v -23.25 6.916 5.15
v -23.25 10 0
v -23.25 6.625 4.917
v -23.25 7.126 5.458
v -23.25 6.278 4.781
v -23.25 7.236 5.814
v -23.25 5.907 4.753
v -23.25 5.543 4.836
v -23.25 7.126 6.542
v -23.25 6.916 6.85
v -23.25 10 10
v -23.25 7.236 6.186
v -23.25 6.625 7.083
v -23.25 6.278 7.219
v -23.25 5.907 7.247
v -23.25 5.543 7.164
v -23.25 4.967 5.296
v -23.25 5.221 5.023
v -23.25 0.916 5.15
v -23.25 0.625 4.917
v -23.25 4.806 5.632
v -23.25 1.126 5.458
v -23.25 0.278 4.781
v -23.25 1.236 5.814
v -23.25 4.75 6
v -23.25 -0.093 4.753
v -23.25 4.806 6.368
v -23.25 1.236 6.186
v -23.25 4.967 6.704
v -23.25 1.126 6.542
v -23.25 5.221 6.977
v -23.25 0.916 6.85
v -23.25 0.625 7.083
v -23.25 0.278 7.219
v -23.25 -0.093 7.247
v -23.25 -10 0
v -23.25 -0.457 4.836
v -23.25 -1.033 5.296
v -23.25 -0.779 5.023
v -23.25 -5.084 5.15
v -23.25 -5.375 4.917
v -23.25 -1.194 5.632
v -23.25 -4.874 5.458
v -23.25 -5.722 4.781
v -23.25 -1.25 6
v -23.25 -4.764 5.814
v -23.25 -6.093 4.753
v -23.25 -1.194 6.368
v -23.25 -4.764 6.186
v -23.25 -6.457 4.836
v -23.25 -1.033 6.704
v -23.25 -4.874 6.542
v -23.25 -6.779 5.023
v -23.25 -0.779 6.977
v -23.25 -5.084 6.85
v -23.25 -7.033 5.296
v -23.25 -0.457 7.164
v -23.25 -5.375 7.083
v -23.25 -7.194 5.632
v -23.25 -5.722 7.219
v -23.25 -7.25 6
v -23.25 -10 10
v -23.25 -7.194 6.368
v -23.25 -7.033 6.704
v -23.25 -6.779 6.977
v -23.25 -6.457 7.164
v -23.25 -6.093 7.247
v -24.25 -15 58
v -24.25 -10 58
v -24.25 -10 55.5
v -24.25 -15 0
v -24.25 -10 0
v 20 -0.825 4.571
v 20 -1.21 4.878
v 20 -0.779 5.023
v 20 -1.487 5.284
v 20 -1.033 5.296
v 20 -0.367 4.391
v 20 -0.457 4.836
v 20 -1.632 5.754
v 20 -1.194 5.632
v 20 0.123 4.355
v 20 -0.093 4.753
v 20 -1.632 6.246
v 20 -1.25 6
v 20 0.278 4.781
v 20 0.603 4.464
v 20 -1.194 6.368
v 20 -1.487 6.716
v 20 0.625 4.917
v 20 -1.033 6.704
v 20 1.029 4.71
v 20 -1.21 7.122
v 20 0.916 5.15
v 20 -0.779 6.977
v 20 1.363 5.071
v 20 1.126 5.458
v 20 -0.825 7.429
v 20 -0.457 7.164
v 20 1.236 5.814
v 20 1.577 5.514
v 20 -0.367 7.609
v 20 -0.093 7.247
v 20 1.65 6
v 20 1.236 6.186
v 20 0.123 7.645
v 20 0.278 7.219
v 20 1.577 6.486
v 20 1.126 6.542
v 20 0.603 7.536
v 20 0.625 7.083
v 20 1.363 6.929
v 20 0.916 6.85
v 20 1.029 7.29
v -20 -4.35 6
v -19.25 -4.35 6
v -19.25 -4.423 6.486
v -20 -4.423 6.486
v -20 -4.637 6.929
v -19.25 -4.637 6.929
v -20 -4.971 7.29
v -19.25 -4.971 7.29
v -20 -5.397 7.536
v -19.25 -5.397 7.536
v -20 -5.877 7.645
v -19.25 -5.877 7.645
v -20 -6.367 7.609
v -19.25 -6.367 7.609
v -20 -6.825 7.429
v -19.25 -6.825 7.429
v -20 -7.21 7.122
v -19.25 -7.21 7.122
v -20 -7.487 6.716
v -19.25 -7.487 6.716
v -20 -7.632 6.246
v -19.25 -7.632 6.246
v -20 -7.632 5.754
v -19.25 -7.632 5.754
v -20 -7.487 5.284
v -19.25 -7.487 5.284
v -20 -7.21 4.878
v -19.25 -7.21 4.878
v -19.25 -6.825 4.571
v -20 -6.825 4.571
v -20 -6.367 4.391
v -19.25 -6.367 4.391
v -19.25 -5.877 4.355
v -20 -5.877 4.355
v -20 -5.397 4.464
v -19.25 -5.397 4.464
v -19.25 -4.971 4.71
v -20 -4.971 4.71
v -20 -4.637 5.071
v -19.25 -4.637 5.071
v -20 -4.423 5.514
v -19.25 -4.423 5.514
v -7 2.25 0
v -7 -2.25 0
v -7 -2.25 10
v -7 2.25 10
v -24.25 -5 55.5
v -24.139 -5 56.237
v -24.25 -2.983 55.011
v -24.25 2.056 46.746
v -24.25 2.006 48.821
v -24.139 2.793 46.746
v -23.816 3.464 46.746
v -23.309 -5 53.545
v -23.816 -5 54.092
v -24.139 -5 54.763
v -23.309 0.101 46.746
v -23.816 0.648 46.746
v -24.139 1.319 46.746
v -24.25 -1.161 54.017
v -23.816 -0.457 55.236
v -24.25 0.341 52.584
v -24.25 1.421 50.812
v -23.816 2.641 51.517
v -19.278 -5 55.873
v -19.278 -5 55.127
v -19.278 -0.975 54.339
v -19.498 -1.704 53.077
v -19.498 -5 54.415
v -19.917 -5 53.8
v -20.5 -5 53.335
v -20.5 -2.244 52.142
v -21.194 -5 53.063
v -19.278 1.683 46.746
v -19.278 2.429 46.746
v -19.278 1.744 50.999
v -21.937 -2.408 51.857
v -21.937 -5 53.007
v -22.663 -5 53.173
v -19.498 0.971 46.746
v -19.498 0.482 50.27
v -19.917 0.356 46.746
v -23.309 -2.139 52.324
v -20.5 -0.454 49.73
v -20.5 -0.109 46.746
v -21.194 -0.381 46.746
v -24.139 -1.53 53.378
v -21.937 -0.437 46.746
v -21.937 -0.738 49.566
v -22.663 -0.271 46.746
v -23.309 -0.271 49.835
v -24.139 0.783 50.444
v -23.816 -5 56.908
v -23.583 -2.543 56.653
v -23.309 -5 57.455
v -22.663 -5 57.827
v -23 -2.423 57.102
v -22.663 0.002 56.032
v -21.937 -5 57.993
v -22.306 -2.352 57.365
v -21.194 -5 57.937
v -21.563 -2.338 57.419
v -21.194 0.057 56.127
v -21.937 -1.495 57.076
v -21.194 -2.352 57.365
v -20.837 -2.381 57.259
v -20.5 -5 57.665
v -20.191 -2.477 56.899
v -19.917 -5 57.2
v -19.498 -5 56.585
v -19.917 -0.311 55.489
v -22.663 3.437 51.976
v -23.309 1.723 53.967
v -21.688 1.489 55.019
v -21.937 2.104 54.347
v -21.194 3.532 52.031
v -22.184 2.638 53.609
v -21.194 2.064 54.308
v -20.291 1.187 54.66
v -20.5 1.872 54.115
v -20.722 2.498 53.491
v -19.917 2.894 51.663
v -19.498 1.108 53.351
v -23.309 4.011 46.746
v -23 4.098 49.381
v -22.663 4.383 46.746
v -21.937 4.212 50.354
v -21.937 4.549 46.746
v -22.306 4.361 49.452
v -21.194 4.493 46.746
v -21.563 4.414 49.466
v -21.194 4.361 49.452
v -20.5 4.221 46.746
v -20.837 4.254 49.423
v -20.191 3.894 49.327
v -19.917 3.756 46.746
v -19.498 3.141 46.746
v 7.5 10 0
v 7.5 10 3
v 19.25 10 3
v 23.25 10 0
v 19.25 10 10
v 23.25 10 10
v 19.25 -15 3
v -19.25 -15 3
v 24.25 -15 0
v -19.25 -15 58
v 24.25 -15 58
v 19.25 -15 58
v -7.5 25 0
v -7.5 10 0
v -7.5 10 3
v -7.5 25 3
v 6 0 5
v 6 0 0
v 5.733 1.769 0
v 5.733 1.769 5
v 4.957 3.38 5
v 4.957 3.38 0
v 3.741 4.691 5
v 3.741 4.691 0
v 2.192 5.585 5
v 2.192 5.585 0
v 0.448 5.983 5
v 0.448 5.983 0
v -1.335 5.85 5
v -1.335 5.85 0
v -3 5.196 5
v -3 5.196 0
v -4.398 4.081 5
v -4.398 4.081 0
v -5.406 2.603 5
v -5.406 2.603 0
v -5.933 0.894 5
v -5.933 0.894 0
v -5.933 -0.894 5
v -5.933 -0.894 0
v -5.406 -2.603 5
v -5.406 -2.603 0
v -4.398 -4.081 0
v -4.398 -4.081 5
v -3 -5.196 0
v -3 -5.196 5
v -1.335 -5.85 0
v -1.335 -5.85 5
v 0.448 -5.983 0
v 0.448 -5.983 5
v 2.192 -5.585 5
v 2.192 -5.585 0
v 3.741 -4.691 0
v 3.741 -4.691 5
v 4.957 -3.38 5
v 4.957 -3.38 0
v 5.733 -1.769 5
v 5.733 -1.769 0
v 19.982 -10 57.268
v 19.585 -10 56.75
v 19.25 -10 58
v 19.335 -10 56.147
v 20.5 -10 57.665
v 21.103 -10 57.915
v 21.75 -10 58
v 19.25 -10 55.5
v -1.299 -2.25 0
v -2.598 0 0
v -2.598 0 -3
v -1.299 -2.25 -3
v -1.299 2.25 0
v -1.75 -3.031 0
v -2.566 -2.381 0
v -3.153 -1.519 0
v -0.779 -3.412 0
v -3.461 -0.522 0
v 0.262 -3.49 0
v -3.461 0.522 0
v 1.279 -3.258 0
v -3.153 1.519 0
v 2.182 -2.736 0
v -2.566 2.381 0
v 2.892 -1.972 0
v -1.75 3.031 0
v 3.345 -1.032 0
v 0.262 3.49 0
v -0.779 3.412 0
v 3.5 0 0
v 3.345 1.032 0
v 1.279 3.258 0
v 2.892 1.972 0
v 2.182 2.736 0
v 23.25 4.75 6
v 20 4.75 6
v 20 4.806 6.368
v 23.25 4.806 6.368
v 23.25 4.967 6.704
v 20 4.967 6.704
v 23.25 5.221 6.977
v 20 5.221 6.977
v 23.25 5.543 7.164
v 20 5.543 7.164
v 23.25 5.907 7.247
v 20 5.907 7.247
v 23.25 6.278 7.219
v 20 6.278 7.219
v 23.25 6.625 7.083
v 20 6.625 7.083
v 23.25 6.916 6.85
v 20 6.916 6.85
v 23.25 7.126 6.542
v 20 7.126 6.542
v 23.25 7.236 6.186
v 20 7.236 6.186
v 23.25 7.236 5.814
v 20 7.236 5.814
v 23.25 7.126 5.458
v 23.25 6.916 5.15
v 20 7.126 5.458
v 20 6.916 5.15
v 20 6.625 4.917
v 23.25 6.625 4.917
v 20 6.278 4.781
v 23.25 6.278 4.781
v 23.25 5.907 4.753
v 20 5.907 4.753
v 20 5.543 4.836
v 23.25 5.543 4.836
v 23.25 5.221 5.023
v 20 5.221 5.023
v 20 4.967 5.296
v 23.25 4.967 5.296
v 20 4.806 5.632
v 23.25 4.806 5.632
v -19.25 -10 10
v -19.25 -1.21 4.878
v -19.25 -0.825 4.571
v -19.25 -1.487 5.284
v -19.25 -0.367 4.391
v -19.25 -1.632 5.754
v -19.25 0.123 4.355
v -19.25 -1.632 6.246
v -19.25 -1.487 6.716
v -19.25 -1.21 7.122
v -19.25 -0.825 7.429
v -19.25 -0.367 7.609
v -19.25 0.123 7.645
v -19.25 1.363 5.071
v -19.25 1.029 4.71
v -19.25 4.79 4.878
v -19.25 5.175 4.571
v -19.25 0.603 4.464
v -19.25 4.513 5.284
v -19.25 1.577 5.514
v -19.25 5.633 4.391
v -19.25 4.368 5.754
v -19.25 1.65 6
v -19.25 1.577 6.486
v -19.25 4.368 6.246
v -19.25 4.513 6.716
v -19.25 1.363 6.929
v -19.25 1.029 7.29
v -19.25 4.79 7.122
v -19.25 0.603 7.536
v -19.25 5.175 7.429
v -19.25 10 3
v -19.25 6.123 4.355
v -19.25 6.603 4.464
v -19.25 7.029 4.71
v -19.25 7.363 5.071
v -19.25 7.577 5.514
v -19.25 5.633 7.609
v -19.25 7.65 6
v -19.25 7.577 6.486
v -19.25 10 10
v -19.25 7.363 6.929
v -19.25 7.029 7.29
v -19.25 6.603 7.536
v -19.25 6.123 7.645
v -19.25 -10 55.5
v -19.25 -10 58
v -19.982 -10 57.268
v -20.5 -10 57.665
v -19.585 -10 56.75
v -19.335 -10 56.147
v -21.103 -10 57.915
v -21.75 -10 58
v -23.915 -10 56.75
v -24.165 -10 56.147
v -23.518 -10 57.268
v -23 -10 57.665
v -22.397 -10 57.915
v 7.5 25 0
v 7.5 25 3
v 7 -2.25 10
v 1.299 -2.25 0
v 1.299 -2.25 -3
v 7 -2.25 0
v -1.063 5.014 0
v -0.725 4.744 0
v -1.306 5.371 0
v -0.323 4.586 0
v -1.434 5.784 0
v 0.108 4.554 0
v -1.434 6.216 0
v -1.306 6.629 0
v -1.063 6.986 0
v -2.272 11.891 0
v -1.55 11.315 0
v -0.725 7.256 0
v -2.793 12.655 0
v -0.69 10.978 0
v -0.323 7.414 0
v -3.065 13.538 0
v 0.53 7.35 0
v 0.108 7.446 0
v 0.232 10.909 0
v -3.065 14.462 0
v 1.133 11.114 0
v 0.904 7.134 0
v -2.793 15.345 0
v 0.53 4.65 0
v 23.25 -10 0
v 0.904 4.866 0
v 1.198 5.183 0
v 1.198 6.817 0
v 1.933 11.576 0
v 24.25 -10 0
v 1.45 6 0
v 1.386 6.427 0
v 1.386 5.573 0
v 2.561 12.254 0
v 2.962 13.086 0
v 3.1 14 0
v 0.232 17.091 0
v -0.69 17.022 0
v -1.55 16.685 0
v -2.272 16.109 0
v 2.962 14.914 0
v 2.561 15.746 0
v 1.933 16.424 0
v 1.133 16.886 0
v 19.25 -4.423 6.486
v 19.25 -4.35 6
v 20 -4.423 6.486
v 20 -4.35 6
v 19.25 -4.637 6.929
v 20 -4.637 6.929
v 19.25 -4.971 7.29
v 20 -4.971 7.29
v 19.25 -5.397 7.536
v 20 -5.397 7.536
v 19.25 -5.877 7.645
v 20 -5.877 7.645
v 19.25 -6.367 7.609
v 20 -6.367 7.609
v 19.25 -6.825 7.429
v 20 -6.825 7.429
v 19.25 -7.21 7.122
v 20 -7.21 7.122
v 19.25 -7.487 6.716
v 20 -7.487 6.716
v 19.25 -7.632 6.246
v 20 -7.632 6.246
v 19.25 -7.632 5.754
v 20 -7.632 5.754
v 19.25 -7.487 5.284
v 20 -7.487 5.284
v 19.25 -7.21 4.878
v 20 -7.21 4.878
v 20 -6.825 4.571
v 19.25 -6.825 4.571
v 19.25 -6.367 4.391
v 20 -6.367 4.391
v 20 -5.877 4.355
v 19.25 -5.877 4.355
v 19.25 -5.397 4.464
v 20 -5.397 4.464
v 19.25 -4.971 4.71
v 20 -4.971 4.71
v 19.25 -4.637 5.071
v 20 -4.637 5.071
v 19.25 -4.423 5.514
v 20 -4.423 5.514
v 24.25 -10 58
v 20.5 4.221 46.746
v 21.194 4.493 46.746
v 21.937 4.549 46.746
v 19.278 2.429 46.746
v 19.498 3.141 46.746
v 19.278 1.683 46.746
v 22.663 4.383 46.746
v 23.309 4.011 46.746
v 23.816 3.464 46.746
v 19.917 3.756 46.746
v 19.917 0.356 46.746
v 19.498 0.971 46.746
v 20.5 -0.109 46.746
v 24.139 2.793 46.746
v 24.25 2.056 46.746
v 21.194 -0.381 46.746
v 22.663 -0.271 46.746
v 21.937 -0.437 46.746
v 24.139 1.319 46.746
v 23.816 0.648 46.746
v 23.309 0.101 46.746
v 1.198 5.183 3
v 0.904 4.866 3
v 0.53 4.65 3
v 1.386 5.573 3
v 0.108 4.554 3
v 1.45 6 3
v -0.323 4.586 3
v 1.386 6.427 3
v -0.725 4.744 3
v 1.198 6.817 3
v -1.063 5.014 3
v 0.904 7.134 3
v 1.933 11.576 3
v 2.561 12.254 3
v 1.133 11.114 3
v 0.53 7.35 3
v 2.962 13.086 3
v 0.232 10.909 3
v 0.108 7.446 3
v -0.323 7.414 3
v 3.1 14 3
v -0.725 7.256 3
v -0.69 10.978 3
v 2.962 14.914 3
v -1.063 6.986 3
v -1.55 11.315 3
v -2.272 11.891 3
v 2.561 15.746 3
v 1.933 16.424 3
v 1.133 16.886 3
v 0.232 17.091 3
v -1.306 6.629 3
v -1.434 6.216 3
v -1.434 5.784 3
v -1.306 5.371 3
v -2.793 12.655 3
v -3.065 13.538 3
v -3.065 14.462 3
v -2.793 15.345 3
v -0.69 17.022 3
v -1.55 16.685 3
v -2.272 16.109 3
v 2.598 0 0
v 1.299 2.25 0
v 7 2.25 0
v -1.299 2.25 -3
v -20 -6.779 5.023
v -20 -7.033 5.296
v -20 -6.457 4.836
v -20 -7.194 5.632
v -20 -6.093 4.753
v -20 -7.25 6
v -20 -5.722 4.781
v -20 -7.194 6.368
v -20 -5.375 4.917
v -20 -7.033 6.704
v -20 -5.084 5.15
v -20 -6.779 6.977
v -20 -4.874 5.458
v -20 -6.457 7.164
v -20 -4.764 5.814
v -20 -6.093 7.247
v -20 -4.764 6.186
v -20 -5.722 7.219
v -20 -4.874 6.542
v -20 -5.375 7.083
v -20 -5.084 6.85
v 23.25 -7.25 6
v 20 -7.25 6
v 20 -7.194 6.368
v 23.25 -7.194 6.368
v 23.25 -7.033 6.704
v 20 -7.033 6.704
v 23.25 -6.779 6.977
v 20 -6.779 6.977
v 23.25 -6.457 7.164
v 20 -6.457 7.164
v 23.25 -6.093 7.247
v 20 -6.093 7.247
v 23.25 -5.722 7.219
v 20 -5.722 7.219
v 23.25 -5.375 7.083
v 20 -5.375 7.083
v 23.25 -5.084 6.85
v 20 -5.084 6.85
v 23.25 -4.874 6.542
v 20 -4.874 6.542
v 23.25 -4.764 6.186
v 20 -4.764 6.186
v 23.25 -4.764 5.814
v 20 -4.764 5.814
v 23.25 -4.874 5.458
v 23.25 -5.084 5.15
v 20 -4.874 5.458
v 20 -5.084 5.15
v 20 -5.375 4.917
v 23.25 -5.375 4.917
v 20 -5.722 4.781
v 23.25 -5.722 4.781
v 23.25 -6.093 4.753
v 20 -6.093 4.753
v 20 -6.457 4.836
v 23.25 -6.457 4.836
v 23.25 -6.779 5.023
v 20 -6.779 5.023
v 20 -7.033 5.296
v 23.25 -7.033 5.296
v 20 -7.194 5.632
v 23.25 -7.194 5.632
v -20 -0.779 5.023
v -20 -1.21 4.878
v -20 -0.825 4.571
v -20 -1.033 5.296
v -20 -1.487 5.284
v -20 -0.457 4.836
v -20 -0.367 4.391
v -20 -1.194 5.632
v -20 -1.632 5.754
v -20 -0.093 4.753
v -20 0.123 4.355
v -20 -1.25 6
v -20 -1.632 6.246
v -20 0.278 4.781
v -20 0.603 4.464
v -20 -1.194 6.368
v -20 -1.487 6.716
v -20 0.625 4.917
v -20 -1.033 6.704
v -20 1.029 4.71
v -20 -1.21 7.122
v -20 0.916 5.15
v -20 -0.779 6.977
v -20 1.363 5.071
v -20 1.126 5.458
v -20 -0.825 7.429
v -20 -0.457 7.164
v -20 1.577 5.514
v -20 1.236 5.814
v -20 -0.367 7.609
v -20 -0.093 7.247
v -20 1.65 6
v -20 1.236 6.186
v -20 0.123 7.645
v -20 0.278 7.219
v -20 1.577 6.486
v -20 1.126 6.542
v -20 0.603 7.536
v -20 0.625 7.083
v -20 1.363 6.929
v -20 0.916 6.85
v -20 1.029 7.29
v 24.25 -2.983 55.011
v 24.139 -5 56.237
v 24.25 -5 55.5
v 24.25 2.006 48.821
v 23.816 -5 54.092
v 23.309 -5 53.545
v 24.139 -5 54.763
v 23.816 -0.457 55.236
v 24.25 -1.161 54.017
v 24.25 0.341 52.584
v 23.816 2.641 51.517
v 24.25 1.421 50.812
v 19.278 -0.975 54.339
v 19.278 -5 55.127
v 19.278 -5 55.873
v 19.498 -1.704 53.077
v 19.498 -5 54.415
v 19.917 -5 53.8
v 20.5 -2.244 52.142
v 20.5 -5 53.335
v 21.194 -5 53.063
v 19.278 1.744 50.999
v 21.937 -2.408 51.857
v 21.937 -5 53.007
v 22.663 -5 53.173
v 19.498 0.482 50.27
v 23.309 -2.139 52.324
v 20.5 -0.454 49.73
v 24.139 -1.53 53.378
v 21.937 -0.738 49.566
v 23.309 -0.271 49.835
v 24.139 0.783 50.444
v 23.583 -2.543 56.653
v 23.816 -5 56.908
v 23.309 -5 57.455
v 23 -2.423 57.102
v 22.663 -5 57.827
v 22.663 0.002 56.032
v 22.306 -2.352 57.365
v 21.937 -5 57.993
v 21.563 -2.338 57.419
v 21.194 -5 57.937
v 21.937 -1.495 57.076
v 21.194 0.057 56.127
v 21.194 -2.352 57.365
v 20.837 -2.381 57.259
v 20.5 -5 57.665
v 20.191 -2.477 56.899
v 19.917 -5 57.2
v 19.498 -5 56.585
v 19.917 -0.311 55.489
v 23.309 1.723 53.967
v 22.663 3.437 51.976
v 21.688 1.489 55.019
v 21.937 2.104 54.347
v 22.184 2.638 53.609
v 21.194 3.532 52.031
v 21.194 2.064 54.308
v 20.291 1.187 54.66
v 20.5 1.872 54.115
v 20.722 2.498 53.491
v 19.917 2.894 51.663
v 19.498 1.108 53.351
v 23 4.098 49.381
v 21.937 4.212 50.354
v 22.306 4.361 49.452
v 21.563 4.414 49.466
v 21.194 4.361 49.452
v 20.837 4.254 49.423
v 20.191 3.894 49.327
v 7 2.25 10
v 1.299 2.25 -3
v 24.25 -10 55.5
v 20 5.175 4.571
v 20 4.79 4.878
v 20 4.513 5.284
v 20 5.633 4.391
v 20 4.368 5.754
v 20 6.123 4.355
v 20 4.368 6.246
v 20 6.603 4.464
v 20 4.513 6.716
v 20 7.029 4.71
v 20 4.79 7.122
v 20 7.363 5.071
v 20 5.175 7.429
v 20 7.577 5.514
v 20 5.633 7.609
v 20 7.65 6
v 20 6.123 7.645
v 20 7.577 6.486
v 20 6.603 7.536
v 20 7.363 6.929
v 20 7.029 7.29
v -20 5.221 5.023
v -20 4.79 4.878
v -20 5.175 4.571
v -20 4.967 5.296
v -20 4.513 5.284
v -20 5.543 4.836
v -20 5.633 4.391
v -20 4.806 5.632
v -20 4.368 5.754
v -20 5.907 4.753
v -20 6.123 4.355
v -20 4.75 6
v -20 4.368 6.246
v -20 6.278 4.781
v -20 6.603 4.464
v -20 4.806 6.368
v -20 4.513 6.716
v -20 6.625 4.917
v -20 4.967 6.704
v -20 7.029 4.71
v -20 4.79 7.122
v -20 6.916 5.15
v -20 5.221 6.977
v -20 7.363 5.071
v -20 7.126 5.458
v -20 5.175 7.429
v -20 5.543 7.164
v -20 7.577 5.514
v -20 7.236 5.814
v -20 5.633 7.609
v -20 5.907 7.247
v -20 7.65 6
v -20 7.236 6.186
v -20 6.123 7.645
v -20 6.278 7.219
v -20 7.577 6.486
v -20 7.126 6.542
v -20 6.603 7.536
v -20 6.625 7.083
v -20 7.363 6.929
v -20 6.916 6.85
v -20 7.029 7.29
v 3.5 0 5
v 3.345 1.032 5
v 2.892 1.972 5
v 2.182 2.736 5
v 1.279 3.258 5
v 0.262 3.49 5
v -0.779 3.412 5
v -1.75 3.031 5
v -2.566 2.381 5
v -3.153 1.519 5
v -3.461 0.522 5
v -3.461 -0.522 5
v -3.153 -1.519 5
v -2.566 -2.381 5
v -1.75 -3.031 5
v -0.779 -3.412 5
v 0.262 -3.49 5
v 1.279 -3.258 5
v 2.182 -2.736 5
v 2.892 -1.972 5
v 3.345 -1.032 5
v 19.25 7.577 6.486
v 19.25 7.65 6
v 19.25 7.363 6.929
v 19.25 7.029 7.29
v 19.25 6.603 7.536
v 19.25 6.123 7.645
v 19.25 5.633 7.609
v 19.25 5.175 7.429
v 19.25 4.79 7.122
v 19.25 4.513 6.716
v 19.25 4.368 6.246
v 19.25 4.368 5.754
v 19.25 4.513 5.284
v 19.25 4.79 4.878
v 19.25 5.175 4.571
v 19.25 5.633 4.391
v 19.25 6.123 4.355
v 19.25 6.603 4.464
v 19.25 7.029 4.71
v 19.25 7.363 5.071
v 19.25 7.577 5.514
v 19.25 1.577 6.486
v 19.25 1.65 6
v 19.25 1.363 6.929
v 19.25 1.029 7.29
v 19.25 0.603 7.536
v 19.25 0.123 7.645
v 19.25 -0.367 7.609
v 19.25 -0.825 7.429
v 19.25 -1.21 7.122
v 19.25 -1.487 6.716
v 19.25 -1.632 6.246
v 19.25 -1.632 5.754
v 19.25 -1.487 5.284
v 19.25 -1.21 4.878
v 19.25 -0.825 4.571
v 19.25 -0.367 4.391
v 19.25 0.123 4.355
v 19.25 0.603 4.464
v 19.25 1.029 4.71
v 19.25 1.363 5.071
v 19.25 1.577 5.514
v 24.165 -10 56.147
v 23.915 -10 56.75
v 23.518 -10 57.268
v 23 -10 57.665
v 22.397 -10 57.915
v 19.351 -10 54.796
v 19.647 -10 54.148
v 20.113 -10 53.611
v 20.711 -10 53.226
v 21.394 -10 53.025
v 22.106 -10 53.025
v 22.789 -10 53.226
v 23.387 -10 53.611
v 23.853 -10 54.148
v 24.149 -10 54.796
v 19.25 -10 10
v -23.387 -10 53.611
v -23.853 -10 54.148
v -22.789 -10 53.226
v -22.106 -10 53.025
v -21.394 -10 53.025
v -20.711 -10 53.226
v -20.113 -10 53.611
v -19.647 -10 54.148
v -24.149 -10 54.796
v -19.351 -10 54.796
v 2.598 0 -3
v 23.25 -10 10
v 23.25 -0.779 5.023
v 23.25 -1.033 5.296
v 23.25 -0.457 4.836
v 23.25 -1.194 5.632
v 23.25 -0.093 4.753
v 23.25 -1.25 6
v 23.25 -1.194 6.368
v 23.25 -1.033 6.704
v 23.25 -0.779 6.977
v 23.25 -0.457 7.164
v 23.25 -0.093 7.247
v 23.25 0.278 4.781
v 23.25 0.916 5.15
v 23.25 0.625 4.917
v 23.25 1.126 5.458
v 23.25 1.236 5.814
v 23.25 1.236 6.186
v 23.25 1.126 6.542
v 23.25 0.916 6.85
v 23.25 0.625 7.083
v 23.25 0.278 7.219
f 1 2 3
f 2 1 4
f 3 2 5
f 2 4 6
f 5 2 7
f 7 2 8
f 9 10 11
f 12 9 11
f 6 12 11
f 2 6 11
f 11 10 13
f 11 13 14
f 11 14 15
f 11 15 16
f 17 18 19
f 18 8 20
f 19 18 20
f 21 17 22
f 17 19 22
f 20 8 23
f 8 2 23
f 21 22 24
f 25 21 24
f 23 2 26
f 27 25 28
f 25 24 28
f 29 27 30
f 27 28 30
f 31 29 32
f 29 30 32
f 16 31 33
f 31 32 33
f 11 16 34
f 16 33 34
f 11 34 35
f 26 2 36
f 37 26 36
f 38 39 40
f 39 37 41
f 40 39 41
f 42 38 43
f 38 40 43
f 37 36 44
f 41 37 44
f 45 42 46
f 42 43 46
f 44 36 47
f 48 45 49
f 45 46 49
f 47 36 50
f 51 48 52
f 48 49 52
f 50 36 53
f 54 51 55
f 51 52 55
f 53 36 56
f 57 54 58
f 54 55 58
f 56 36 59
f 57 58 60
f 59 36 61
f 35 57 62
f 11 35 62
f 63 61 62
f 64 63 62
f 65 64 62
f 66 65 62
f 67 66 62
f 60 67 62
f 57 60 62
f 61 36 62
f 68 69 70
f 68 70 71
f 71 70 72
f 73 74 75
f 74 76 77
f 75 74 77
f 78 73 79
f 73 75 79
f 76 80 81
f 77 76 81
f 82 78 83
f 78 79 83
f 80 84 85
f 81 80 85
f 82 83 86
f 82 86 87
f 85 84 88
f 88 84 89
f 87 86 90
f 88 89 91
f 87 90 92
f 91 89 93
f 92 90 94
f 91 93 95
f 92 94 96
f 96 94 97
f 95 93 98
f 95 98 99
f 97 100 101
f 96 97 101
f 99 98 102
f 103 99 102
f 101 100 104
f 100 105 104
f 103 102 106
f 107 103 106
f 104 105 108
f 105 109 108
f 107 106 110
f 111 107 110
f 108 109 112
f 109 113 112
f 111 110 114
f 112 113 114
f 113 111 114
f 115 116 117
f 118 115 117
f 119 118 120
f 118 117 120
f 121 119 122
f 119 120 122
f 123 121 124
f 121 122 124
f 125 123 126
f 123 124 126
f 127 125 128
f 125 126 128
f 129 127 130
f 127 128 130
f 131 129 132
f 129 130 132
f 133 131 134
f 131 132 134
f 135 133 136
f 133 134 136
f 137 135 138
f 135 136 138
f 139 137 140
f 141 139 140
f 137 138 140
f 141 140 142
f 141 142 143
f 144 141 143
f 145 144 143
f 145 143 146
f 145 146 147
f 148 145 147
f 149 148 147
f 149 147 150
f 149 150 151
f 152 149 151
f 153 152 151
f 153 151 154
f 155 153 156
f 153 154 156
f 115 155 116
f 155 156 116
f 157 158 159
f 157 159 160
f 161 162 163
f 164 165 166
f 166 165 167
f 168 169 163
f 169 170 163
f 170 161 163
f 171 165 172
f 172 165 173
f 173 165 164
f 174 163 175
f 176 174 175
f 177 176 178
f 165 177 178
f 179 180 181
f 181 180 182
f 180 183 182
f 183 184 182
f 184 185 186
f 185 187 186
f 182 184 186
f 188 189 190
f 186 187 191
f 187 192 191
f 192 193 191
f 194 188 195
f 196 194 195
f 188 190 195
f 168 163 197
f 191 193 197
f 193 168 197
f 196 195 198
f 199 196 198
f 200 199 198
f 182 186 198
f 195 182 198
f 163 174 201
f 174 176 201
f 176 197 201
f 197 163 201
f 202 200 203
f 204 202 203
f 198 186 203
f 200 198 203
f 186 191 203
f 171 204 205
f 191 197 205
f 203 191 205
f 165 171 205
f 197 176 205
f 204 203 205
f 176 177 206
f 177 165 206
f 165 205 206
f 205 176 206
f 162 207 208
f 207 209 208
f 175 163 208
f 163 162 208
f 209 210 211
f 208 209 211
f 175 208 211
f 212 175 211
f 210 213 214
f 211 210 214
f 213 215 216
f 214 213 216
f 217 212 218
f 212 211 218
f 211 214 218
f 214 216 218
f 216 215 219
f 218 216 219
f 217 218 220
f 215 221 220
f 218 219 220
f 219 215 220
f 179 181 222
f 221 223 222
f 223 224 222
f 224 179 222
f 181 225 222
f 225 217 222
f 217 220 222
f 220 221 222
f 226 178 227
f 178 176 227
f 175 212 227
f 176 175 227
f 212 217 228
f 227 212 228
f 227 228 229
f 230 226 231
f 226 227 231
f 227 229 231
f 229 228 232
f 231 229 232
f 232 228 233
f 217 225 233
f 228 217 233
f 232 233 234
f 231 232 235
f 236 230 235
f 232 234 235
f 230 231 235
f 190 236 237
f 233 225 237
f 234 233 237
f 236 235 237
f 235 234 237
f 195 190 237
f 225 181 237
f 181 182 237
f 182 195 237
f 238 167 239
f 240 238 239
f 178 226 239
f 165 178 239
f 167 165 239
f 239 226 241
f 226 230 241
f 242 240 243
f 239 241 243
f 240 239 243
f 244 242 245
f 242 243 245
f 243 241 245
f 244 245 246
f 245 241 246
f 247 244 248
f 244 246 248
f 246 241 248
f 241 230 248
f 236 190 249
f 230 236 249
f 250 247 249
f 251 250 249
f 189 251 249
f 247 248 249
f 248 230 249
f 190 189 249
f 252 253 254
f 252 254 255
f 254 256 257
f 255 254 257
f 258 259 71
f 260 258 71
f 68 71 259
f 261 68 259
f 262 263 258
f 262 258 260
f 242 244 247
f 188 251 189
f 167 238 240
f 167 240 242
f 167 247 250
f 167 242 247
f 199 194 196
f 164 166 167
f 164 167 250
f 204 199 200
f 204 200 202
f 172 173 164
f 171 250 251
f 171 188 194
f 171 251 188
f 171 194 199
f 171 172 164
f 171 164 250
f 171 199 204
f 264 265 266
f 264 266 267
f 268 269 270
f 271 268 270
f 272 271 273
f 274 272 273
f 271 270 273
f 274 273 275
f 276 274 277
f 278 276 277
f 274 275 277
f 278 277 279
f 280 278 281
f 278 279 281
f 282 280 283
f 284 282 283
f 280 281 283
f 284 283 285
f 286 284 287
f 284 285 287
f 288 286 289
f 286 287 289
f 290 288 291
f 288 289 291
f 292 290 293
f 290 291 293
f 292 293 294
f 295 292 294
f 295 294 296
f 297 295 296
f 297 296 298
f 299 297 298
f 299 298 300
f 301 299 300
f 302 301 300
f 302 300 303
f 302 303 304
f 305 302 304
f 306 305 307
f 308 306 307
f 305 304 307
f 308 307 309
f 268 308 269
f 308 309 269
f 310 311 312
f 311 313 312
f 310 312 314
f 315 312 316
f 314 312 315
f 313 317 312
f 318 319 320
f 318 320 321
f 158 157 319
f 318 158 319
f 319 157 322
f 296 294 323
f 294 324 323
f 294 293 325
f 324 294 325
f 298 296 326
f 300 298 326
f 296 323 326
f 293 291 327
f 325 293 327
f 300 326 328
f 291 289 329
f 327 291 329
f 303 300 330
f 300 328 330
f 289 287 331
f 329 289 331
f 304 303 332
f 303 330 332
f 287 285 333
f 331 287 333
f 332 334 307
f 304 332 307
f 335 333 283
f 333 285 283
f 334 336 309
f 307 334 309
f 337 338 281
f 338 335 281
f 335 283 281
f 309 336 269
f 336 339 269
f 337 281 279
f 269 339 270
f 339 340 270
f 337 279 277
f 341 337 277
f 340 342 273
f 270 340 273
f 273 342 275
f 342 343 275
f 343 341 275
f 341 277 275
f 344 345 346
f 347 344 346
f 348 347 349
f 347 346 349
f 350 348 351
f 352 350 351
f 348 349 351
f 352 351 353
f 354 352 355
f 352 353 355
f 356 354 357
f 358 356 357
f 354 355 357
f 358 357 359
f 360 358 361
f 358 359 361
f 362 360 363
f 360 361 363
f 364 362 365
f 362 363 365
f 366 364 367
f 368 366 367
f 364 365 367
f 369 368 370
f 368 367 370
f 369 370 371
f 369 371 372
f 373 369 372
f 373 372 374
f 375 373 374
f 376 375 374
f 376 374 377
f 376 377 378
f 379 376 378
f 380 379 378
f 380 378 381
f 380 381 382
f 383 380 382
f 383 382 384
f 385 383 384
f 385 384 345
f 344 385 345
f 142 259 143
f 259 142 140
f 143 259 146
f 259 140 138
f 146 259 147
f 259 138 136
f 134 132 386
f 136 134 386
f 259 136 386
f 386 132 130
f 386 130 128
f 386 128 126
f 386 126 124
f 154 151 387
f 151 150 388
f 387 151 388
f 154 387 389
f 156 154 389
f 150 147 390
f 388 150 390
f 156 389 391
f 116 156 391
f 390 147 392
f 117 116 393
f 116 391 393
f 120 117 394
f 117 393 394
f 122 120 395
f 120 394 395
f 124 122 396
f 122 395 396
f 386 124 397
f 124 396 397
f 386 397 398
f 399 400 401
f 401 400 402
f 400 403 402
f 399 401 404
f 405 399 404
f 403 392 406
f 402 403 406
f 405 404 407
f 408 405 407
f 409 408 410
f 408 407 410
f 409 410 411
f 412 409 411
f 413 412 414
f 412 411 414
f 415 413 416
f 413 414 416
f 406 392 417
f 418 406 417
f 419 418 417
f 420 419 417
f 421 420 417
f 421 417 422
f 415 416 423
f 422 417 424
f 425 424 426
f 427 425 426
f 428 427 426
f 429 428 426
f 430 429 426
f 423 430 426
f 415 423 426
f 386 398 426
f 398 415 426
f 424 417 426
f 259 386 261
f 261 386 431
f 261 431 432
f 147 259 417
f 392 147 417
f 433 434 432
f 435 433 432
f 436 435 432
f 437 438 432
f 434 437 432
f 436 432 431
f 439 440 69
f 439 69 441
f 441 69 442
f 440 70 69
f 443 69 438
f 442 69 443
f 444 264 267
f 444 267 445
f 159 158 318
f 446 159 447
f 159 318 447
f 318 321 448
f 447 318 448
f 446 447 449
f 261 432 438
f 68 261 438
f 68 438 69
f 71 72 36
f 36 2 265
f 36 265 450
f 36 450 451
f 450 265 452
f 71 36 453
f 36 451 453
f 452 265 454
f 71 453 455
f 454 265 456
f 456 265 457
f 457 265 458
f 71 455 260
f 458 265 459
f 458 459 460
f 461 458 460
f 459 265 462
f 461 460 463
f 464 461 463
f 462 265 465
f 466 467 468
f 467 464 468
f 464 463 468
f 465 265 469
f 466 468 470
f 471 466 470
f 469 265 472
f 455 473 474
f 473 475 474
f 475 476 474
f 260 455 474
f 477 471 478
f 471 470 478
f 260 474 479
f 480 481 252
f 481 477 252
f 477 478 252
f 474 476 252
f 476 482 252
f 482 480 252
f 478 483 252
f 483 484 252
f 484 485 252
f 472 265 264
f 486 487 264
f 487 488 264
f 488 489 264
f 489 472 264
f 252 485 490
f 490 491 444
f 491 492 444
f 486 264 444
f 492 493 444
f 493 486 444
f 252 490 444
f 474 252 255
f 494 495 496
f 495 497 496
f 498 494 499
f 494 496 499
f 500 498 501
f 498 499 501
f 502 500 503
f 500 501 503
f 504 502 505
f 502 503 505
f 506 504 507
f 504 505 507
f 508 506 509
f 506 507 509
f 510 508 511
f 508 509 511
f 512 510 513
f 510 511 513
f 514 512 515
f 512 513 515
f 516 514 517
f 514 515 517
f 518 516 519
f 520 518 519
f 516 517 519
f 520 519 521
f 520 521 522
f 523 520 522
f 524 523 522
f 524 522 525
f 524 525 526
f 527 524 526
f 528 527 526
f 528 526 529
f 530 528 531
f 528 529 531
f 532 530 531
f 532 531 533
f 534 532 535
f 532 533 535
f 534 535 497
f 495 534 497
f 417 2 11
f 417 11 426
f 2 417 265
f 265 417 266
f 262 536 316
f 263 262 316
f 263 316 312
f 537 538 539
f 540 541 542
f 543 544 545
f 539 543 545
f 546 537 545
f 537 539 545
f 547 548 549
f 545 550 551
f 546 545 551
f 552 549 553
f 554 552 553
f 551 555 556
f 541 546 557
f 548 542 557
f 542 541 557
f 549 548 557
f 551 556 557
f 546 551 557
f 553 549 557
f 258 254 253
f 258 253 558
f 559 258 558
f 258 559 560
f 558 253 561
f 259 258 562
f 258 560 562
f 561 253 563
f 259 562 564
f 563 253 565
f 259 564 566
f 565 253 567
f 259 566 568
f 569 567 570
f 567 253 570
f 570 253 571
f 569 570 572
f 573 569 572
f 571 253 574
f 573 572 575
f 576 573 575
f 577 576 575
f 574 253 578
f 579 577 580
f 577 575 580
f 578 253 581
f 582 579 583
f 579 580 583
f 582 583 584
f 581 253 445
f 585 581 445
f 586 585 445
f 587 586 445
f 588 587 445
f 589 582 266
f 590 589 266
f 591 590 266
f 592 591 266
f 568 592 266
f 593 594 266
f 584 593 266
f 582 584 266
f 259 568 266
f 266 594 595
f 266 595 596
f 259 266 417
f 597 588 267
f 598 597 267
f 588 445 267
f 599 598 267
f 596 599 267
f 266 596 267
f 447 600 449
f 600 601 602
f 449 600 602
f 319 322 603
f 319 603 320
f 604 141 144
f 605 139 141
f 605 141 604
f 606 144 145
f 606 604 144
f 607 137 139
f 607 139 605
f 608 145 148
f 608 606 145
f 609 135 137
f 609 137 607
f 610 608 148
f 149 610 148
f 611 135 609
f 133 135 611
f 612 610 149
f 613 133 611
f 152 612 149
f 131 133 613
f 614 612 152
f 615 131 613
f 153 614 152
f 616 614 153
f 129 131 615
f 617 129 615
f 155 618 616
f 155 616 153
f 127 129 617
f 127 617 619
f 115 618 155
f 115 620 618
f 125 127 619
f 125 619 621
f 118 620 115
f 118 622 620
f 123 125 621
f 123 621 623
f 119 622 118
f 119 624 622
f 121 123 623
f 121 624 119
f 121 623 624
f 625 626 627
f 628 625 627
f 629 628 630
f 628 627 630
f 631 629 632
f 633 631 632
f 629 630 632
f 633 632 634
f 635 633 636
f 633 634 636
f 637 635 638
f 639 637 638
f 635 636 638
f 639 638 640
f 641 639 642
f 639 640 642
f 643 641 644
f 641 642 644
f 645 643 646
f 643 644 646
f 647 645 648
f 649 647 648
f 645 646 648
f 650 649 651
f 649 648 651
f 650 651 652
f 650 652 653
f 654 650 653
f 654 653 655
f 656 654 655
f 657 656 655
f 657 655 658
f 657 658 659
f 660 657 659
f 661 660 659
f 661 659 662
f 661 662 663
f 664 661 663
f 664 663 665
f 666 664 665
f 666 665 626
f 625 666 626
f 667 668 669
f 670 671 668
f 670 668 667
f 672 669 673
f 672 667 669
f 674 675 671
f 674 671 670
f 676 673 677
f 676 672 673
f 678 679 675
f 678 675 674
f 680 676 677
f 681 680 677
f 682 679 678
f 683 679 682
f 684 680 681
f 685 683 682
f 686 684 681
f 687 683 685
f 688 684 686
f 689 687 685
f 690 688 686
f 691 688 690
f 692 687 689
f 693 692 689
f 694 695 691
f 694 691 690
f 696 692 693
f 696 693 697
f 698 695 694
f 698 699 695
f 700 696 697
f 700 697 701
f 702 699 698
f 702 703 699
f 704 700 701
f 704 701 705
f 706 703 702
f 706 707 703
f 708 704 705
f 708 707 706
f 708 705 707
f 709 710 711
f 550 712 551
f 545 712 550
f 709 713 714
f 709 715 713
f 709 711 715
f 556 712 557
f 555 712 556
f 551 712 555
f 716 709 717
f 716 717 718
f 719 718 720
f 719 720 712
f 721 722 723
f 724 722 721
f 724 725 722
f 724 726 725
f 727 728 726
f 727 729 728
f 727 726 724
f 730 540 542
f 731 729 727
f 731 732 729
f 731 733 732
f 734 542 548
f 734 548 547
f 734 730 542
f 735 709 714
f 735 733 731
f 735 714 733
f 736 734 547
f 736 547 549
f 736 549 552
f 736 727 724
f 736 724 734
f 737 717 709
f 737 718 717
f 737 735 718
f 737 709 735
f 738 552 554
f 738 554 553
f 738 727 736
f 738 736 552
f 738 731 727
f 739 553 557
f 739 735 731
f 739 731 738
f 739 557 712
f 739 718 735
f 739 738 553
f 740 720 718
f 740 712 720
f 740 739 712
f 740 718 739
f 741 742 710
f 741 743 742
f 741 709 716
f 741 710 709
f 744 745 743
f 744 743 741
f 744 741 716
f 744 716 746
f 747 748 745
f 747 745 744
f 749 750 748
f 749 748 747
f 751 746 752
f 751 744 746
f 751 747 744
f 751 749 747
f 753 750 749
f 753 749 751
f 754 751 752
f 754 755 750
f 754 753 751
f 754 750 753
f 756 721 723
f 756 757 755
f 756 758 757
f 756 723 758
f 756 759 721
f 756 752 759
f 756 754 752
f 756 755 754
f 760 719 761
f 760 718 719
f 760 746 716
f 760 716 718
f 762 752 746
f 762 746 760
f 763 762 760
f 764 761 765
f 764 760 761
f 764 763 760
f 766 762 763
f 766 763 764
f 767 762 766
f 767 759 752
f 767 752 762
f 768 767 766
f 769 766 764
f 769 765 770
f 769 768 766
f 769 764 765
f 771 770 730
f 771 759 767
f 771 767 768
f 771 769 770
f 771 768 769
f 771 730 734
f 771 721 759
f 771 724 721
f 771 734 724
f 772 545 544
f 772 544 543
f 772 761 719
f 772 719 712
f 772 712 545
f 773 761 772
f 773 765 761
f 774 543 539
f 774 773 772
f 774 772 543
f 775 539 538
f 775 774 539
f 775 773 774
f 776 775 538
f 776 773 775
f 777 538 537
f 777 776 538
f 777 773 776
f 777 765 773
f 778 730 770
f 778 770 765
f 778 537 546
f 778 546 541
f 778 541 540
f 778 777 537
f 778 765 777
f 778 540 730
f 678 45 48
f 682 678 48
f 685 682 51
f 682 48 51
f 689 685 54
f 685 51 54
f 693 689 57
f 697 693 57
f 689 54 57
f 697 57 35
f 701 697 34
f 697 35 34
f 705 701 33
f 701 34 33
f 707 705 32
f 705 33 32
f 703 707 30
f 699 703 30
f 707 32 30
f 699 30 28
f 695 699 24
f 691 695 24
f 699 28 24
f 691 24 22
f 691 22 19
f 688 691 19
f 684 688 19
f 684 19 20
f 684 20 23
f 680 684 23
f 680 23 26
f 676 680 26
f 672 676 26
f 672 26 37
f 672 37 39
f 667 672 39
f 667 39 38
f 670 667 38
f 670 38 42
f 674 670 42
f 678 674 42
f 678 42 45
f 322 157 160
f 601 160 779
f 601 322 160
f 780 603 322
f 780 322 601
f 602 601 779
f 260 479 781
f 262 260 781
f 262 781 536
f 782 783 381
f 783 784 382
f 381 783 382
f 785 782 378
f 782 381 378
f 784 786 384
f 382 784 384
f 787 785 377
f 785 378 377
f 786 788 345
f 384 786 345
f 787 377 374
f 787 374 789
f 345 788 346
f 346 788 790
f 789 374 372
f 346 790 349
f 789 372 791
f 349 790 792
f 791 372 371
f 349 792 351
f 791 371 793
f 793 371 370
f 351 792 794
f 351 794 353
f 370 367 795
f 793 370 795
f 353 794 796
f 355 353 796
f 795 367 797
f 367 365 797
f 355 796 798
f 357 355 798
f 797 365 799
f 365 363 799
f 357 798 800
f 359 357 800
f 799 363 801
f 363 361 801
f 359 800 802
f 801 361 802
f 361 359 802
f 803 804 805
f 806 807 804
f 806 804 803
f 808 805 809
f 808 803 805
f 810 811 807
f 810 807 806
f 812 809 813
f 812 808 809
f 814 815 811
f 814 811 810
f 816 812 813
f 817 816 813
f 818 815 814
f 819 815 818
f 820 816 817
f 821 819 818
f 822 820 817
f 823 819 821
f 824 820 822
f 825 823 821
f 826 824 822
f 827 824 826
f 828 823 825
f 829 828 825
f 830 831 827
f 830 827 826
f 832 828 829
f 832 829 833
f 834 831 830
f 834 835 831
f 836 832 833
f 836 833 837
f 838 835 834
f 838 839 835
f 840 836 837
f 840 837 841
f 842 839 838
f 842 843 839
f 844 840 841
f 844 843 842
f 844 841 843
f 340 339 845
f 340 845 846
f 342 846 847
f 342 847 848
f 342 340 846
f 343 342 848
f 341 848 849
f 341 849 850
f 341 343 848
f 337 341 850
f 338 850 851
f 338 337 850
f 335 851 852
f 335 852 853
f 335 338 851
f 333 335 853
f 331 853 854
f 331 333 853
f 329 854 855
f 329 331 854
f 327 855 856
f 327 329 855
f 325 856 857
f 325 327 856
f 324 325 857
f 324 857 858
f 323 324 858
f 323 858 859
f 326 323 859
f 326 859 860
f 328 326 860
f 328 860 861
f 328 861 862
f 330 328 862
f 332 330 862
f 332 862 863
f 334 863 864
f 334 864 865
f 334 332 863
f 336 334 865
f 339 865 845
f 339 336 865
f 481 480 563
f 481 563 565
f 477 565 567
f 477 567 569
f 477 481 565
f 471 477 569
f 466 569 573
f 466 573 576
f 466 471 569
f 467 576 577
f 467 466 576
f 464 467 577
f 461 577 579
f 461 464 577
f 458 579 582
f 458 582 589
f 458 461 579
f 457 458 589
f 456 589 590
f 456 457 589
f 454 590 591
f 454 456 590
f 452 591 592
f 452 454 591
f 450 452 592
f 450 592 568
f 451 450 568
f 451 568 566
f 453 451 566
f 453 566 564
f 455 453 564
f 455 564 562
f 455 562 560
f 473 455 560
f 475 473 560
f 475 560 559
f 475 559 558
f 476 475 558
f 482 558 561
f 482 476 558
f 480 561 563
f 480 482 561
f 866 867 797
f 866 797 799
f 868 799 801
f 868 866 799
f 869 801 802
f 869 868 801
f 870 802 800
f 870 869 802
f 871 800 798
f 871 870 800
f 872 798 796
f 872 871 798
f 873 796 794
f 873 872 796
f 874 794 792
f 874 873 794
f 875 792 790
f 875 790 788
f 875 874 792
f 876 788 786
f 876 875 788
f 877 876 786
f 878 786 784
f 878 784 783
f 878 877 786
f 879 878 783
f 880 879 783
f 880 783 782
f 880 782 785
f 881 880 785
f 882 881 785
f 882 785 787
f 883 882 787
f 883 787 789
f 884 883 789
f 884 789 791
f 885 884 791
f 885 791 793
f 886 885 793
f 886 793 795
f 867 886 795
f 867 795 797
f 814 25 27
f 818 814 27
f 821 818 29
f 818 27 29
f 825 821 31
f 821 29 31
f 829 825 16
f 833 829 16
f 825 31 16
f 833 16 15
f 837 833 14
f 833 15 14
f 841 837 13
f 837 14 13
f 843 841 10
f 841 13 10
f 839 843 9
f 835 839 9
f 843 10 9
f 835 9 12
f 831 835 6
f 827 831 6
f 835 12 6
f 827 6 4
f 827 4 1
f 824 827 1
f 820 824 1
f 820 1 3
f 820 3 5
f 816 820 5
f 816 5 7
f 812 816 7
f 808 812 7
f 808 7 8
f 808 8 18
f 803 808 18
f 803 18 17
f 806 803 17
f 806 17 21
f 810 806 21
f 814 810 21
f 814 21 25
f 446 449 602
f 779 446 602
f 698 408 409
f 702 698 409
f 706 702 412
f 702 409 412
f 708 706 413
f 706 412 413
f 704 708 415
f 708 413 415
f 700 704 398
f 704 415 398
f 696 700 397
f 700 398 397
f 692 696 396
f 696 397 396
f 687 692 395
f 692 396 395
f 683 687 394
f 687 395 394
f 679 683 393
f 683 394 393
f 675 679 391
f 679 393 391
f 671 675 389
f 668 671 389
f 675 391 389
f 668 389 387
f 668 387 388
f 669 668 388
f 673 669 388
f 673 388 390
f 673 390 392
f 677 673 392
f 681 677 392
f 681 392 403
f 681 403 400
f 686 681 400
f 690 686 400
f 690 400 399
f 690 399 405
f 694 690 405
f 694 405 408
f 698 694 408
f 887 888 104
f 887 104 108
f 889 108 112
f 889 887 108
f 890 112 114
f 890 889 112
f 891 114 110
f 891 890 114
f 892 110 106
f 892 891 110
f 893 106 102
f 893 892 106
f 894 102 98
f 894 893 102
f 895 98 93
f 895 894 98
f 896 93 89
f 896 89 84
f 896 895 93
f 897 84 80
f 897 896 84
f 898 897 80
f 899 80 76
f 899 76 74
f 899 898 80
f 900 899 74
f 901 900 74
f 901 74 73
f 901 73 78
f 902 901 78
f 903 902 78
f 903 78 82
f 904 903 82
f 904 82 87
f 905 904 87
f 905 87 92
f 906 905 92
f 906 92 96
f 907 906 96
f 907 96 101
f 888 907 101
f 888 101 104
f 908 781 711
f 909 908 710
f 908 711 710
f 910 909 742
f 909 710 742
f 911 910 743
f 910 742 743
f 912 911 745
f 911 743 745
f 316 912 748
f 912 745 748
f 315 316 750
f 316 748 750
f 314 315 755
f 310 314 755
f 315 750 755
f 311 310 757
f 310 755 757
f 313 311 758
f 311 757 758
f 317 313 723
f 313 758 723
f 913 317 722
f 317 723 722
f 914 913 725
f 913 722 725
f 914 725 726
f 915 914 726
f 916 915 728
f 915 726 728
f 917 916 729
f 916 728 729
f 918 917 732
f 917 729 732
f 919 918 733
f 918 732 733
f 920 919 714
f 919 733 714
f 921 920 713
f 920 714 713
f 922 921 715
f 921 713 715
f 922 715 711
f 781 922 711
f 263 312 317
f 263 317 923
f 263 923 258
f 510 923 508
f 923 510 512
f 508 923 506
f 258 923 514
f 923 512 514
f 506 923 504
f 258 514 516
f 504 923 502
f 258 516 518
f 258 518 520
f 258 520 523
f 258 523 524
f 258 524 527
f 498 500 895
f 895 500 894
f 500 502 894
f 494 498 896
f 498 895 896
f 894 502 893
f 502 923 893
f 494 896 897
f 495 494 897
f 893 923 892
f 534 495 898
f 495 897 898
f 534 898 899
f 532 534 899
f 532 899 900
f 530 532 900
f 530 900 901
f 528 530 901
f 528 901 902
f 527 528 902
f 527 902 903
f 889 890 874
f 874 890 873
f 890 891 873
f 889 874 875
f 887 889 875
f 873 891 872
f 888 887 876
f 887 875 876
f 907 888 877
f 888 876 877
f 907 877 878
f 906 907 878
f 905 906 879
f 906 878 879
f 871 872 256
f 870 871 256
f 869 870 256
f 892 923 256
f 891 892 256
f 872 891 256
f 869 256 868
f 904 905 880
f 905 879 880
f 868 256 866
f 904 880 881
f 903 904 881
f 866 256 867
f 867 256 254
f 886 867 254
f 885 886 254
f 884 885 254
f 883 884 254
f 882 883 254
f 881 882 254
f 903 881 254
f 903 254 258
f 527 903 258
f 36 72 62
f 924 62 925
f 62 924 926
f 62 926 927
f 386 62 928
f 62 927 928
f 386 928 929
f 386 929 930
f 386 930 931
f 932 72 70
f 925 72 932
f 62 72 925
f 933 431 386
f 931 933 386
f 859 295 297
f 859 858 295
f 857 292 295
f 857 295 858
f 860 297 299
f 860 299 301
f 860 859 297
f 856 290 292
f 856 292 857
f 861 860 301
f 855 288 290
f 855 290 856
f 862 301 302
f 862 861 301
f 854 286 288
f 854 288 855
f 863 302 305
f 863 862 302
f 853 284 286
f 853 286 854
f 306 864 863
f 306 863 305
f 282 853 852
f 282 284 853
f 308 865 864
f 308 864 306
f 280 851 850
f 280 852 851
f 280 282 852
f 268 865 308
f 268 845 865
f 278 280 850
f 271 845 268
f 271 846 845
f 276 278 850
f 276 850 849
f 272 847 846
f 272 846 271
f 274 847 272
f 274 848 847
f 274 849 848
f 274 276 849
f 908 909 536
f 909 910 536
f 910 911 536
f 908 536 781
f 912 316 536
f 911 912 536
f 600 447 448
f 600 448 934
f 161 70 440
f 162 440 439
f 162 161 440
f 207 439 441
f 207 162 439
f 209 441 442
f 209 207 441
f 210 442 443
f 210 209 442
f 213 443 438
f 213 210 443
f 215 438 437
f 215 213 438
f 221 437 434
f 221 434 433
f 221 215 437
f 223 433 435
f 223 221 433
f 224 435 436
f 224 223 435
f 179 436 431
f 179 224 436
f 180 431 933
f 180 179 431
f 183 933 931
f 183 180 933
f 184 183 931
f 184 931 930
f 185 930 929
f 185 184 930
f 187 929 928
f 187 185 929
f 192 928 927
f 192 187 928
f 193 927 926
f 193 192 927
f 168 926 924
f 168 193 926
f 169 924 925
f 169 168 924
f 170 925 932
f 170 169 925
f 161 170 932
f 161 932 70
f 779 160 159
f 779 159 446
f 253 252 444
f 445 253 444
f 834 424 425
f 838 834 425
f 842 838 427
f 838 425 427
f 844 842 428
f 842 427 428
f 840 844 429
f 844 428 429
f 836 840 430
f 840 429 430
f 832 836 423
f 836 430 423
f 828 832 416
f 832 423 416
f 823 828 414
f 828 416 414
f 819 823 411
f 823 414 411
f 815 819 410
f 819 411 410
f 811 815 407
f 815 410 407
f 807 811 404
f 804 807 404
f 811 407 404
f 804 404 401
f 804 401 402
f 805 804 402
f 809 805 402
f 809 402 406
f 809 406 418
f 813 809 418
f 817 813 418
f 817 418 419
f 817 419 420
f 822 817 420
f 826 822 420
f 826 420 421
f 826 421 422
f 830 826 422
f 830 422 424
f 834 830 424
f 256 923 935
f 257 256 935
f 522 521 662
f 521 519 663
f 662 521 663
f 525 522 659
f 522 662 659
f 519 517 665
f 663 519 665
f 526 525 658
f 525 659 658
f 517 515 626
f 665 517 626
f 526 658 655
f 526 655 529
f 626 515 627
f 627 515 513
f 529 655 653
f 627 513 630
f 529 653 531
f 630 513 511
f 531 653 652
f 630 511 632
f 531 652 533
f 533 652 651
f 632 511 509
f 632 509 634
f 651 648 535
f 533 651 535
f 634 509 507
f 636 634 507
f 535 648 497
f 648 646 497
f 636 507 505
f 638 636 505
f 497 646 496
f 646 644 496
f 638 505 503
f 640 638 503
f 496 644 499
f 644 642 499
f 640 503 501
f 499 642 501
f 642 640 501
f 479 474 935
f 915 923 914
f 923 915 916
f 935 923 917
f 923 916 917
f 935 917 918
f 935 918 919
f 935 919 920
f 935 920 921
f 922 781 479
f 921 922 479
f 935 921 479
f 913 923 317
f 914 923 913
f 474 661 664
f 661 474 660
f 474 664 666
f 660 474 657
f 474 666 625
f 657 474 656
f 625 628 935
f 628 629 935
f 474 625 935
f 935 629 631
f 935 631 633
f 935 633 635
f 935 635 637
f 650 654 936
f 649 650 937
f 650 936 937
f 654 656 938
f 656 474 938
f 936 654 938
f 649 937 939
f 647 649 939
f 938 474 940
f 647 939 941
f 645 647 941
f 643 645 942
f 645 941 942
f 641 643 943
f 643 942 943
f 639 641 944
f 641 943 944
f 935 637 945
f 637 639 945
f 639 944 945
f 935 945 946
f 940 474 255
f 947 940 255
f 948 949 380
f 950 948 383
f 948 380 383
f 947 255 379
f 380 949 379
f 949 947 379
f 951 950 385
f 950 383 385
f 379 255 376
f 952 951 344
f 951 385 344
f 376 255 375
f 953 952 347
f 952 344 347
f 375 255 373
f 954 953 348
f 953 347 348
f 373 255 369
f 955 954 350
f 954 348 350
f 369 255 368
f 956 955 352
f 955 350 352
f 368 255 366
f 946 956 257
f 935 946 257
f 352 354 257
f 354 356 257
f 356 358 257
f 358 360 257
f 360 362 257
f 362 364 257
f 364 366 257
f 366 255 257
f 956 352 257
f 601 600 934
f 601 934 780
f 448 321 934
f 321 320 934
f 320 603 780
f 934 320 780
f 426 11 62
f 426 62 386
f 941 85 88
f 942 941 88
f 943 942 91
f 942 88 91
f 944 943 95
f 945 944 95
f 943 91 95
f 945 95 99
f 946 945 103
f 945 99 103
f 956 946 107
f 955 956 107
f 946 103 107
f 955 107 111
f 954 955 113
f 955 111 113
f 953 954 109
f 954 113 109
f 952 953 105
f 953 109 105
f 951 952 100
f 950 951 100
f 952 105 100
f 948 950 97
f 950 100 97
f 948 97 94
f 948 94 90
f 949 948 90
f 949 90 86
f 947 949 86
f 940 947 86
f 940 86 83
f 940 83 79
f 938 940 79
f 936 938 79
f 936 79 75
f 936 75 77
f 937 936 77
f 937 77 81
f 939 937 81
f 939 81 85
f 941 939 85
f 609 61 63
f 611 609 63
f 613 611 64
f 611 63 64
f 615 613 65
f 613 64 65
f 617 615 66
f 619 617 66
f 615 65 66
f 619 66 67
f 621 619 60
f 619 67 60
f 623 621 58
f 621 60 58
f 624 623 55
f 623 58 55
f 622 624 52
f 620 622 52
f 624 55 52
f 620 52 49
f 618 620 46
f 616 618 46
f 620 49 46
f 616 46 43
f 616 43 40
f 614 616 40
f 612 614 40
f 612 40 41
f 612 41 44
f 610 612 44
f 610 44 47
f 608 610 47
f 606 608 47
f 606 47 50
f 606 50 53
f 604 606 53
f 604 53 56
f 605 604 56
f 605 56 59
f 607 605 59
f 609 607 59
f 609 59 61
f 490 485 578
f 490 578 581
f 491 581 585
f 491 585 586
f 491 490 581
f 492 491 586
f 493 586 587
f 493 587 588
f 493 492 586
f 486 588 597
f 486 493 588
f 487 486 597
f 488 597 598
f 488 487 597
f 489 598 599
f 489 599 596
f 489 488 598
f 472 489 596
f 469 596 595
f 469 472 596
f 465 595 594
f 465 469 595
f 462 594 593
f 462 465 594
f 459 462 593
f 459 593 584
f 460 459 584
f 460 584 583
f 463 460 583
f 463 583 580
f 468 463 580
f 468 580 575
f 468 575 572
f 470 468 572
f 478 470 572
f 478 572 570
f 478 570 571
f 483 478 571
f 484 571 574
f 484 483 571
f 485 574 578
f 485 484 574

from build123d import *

# Parameters (mm, degrees)
SKETCH_W        = 38.5
SKETCH_H        = 20
SKETCH_R        = 1.45
PAD_DEPTH       = 3
SKETCH001_W     = 4
SKETCH001_H     = 10
PAD001_DEPTH    = 10
SKETCH002_R     = 1.25
POCKET_DEPTH    = 46.501
SKETCH003_R     = 1.65
POCKET001_DEPTH = 20
PAD002_DEPTH    = 5
SKETCH005_R     = 2.5
SKETCH007_W     = 15
SKETCH007_H     = 15
SKETCH007_R     = 3.1
PAD003_DEPTH    = 3
SKETCH008_R     = 6
SKETCH008_R_2   = 3.5
PAD004_DEPTH    = 5
PAD005_DEPTH    = 3
SKETCH010_W     = 14
SKETCH010_H     = 4.5
PAD006_DEPTH    = 10


with BuildPart() as body:
    # Sketch → Pad (new body)
    with BuildSketch(Plane.XY):
        Rectangle(SKETCH_W, SKETCH_H)
        with Locations((0, 6)):
            Circle(SKETCH_R, mode=Mode.SUBTRACT)
    extrude(amount=PAD_DEPTH)

    # Sketch001 → Pad001 (join, symmetric)
    with BuildSketch(Plane.XZ):
        with Locations((21.25, 5)):
            Rectangle(SKETCH001_W, SKETCH001_H)
        with Locations((-21.25, 5)):
            Rectangle(SKETCH001_W, SKETCH001_H)
    extrude(amount=PAD001_DEPTH, both=True)

    # Sketch002 (on Face9 of Pad001) → Pocket (cut, through all)
    with BuildSketch(Plane(origin=(-23.25, 0, 0), x_dir=(0, -1, 0), z_dir=(-1, 0, 0))):
        with Locations((-6, 6)):
            Circle(SKETCH002_R)
        with Locations((6, 6)):
            Circle(SKETCH002_R)
        with Locations((0, 6)):
            Circle(SKETCH002_R)
    extrude(amount=-POCKET_DEPTH, mode=Mode.SUBTRACT)

    # Sketch003 → Pocket001 (cut, symmetric)
    with BuildSketch(Plane.YZ):
        with Locations((0, 6)):
            Circle(SKETCH003_R)
        with Locations((6, 6)):
            Circle(SKETCH003_R)
        with Locations((-6, 6)):
            Circle(SKETCH003_R)
    extrude(amount=POCKET001_DEPTH, both=True, mode=Mode.SUBTRACT)

    # Sketch004 (on Face14 of Pocket001) → Pad002 (join)
    with BuildSketch(Plane.XZ.offset(10)):
        Polygon((19.25, 0), (24.25, 0), (24.25, 58), (19.25, 58), (19.25, 3), (-19.25, 3), (-19.25, 58), (-24.25, 58), (-24.25, 0), (-19.25, 0), align=None)
    extrude(amount=PAD002_DEPTH)

    # AdditivePipe: sweep along a path in Sketch006
    with BuildLine(Plane.YZ.offset(-21.75)) as additivepipe_path:
        Line((-10, 55.55), (-5, 55.55))
        ThreePointArc((-5, 55.55), (0.376283, 52.619826), (2.105943, 46.746275))
    # Sketch005 (on Face17 of Pad002) → AdditivePipe (sweep)
    with BuildSketch(Plane(origin=(0, -10, 0), x_dir=(-1, 0, 0), z_dir=(0, 1, 0))):
        with Locations((21.75, 55.5)):
            Circle(SKETCH005_R)
    additivepipe = sweep(path=additivepipe_path.line)

    # Mirrored: AdditivePipe across Sketch005 V_Axis
    add(additivepipe.mirror(Plane(origin=(0, -10, 0), x_dir=(0, 1, 0), z_dir=(-1, 0, 0))))

    # Sketch007 → Pad003 (join)
    with BuildSketch(Plane.XY):
        with Locations((0, 17.5)):
            Rectangle(SKETCH007_W, SKETCH007_H)
        with Locations((0, 14)):
            Circle(SKETCH007_R, mode=Mode.SUBTRACT)
    extrude(amount=PAD003_DEPTH)


with BuildPart() as spacer:
    # Sketch008 → Pad004 (new body)
    with BuildSketch(Plane.XY):
        Circle(SKETCH008_R)
        Circle(SKETCH008_R_2, mode=Mode.SUBTRACT)
    extrude(amount=PAD004_DEPTH)


with BuildPart() as bits:
    # Sketch009 → Pad005 (new body)
    with BuildSketch(Plane.XY):
        Polygon((-1.299038, -2.25), (1.299038, -2.25), (2.598076, 0), (1.299038, 2.25), (-1.299038, 2.25), (-2.598076, 0), align=None)
    extrude(amount=-PAD005_DEPTH)

    # Sketch010 → Pad006 (join)
    with BuildSketch(Plane.XY):
        Rectangle(SKETCH010_W, SKETCH010_H)
    extrude(amount=PAD006_DEPTH)


solid = Compound([body.part, spacer.part, bits.part])
